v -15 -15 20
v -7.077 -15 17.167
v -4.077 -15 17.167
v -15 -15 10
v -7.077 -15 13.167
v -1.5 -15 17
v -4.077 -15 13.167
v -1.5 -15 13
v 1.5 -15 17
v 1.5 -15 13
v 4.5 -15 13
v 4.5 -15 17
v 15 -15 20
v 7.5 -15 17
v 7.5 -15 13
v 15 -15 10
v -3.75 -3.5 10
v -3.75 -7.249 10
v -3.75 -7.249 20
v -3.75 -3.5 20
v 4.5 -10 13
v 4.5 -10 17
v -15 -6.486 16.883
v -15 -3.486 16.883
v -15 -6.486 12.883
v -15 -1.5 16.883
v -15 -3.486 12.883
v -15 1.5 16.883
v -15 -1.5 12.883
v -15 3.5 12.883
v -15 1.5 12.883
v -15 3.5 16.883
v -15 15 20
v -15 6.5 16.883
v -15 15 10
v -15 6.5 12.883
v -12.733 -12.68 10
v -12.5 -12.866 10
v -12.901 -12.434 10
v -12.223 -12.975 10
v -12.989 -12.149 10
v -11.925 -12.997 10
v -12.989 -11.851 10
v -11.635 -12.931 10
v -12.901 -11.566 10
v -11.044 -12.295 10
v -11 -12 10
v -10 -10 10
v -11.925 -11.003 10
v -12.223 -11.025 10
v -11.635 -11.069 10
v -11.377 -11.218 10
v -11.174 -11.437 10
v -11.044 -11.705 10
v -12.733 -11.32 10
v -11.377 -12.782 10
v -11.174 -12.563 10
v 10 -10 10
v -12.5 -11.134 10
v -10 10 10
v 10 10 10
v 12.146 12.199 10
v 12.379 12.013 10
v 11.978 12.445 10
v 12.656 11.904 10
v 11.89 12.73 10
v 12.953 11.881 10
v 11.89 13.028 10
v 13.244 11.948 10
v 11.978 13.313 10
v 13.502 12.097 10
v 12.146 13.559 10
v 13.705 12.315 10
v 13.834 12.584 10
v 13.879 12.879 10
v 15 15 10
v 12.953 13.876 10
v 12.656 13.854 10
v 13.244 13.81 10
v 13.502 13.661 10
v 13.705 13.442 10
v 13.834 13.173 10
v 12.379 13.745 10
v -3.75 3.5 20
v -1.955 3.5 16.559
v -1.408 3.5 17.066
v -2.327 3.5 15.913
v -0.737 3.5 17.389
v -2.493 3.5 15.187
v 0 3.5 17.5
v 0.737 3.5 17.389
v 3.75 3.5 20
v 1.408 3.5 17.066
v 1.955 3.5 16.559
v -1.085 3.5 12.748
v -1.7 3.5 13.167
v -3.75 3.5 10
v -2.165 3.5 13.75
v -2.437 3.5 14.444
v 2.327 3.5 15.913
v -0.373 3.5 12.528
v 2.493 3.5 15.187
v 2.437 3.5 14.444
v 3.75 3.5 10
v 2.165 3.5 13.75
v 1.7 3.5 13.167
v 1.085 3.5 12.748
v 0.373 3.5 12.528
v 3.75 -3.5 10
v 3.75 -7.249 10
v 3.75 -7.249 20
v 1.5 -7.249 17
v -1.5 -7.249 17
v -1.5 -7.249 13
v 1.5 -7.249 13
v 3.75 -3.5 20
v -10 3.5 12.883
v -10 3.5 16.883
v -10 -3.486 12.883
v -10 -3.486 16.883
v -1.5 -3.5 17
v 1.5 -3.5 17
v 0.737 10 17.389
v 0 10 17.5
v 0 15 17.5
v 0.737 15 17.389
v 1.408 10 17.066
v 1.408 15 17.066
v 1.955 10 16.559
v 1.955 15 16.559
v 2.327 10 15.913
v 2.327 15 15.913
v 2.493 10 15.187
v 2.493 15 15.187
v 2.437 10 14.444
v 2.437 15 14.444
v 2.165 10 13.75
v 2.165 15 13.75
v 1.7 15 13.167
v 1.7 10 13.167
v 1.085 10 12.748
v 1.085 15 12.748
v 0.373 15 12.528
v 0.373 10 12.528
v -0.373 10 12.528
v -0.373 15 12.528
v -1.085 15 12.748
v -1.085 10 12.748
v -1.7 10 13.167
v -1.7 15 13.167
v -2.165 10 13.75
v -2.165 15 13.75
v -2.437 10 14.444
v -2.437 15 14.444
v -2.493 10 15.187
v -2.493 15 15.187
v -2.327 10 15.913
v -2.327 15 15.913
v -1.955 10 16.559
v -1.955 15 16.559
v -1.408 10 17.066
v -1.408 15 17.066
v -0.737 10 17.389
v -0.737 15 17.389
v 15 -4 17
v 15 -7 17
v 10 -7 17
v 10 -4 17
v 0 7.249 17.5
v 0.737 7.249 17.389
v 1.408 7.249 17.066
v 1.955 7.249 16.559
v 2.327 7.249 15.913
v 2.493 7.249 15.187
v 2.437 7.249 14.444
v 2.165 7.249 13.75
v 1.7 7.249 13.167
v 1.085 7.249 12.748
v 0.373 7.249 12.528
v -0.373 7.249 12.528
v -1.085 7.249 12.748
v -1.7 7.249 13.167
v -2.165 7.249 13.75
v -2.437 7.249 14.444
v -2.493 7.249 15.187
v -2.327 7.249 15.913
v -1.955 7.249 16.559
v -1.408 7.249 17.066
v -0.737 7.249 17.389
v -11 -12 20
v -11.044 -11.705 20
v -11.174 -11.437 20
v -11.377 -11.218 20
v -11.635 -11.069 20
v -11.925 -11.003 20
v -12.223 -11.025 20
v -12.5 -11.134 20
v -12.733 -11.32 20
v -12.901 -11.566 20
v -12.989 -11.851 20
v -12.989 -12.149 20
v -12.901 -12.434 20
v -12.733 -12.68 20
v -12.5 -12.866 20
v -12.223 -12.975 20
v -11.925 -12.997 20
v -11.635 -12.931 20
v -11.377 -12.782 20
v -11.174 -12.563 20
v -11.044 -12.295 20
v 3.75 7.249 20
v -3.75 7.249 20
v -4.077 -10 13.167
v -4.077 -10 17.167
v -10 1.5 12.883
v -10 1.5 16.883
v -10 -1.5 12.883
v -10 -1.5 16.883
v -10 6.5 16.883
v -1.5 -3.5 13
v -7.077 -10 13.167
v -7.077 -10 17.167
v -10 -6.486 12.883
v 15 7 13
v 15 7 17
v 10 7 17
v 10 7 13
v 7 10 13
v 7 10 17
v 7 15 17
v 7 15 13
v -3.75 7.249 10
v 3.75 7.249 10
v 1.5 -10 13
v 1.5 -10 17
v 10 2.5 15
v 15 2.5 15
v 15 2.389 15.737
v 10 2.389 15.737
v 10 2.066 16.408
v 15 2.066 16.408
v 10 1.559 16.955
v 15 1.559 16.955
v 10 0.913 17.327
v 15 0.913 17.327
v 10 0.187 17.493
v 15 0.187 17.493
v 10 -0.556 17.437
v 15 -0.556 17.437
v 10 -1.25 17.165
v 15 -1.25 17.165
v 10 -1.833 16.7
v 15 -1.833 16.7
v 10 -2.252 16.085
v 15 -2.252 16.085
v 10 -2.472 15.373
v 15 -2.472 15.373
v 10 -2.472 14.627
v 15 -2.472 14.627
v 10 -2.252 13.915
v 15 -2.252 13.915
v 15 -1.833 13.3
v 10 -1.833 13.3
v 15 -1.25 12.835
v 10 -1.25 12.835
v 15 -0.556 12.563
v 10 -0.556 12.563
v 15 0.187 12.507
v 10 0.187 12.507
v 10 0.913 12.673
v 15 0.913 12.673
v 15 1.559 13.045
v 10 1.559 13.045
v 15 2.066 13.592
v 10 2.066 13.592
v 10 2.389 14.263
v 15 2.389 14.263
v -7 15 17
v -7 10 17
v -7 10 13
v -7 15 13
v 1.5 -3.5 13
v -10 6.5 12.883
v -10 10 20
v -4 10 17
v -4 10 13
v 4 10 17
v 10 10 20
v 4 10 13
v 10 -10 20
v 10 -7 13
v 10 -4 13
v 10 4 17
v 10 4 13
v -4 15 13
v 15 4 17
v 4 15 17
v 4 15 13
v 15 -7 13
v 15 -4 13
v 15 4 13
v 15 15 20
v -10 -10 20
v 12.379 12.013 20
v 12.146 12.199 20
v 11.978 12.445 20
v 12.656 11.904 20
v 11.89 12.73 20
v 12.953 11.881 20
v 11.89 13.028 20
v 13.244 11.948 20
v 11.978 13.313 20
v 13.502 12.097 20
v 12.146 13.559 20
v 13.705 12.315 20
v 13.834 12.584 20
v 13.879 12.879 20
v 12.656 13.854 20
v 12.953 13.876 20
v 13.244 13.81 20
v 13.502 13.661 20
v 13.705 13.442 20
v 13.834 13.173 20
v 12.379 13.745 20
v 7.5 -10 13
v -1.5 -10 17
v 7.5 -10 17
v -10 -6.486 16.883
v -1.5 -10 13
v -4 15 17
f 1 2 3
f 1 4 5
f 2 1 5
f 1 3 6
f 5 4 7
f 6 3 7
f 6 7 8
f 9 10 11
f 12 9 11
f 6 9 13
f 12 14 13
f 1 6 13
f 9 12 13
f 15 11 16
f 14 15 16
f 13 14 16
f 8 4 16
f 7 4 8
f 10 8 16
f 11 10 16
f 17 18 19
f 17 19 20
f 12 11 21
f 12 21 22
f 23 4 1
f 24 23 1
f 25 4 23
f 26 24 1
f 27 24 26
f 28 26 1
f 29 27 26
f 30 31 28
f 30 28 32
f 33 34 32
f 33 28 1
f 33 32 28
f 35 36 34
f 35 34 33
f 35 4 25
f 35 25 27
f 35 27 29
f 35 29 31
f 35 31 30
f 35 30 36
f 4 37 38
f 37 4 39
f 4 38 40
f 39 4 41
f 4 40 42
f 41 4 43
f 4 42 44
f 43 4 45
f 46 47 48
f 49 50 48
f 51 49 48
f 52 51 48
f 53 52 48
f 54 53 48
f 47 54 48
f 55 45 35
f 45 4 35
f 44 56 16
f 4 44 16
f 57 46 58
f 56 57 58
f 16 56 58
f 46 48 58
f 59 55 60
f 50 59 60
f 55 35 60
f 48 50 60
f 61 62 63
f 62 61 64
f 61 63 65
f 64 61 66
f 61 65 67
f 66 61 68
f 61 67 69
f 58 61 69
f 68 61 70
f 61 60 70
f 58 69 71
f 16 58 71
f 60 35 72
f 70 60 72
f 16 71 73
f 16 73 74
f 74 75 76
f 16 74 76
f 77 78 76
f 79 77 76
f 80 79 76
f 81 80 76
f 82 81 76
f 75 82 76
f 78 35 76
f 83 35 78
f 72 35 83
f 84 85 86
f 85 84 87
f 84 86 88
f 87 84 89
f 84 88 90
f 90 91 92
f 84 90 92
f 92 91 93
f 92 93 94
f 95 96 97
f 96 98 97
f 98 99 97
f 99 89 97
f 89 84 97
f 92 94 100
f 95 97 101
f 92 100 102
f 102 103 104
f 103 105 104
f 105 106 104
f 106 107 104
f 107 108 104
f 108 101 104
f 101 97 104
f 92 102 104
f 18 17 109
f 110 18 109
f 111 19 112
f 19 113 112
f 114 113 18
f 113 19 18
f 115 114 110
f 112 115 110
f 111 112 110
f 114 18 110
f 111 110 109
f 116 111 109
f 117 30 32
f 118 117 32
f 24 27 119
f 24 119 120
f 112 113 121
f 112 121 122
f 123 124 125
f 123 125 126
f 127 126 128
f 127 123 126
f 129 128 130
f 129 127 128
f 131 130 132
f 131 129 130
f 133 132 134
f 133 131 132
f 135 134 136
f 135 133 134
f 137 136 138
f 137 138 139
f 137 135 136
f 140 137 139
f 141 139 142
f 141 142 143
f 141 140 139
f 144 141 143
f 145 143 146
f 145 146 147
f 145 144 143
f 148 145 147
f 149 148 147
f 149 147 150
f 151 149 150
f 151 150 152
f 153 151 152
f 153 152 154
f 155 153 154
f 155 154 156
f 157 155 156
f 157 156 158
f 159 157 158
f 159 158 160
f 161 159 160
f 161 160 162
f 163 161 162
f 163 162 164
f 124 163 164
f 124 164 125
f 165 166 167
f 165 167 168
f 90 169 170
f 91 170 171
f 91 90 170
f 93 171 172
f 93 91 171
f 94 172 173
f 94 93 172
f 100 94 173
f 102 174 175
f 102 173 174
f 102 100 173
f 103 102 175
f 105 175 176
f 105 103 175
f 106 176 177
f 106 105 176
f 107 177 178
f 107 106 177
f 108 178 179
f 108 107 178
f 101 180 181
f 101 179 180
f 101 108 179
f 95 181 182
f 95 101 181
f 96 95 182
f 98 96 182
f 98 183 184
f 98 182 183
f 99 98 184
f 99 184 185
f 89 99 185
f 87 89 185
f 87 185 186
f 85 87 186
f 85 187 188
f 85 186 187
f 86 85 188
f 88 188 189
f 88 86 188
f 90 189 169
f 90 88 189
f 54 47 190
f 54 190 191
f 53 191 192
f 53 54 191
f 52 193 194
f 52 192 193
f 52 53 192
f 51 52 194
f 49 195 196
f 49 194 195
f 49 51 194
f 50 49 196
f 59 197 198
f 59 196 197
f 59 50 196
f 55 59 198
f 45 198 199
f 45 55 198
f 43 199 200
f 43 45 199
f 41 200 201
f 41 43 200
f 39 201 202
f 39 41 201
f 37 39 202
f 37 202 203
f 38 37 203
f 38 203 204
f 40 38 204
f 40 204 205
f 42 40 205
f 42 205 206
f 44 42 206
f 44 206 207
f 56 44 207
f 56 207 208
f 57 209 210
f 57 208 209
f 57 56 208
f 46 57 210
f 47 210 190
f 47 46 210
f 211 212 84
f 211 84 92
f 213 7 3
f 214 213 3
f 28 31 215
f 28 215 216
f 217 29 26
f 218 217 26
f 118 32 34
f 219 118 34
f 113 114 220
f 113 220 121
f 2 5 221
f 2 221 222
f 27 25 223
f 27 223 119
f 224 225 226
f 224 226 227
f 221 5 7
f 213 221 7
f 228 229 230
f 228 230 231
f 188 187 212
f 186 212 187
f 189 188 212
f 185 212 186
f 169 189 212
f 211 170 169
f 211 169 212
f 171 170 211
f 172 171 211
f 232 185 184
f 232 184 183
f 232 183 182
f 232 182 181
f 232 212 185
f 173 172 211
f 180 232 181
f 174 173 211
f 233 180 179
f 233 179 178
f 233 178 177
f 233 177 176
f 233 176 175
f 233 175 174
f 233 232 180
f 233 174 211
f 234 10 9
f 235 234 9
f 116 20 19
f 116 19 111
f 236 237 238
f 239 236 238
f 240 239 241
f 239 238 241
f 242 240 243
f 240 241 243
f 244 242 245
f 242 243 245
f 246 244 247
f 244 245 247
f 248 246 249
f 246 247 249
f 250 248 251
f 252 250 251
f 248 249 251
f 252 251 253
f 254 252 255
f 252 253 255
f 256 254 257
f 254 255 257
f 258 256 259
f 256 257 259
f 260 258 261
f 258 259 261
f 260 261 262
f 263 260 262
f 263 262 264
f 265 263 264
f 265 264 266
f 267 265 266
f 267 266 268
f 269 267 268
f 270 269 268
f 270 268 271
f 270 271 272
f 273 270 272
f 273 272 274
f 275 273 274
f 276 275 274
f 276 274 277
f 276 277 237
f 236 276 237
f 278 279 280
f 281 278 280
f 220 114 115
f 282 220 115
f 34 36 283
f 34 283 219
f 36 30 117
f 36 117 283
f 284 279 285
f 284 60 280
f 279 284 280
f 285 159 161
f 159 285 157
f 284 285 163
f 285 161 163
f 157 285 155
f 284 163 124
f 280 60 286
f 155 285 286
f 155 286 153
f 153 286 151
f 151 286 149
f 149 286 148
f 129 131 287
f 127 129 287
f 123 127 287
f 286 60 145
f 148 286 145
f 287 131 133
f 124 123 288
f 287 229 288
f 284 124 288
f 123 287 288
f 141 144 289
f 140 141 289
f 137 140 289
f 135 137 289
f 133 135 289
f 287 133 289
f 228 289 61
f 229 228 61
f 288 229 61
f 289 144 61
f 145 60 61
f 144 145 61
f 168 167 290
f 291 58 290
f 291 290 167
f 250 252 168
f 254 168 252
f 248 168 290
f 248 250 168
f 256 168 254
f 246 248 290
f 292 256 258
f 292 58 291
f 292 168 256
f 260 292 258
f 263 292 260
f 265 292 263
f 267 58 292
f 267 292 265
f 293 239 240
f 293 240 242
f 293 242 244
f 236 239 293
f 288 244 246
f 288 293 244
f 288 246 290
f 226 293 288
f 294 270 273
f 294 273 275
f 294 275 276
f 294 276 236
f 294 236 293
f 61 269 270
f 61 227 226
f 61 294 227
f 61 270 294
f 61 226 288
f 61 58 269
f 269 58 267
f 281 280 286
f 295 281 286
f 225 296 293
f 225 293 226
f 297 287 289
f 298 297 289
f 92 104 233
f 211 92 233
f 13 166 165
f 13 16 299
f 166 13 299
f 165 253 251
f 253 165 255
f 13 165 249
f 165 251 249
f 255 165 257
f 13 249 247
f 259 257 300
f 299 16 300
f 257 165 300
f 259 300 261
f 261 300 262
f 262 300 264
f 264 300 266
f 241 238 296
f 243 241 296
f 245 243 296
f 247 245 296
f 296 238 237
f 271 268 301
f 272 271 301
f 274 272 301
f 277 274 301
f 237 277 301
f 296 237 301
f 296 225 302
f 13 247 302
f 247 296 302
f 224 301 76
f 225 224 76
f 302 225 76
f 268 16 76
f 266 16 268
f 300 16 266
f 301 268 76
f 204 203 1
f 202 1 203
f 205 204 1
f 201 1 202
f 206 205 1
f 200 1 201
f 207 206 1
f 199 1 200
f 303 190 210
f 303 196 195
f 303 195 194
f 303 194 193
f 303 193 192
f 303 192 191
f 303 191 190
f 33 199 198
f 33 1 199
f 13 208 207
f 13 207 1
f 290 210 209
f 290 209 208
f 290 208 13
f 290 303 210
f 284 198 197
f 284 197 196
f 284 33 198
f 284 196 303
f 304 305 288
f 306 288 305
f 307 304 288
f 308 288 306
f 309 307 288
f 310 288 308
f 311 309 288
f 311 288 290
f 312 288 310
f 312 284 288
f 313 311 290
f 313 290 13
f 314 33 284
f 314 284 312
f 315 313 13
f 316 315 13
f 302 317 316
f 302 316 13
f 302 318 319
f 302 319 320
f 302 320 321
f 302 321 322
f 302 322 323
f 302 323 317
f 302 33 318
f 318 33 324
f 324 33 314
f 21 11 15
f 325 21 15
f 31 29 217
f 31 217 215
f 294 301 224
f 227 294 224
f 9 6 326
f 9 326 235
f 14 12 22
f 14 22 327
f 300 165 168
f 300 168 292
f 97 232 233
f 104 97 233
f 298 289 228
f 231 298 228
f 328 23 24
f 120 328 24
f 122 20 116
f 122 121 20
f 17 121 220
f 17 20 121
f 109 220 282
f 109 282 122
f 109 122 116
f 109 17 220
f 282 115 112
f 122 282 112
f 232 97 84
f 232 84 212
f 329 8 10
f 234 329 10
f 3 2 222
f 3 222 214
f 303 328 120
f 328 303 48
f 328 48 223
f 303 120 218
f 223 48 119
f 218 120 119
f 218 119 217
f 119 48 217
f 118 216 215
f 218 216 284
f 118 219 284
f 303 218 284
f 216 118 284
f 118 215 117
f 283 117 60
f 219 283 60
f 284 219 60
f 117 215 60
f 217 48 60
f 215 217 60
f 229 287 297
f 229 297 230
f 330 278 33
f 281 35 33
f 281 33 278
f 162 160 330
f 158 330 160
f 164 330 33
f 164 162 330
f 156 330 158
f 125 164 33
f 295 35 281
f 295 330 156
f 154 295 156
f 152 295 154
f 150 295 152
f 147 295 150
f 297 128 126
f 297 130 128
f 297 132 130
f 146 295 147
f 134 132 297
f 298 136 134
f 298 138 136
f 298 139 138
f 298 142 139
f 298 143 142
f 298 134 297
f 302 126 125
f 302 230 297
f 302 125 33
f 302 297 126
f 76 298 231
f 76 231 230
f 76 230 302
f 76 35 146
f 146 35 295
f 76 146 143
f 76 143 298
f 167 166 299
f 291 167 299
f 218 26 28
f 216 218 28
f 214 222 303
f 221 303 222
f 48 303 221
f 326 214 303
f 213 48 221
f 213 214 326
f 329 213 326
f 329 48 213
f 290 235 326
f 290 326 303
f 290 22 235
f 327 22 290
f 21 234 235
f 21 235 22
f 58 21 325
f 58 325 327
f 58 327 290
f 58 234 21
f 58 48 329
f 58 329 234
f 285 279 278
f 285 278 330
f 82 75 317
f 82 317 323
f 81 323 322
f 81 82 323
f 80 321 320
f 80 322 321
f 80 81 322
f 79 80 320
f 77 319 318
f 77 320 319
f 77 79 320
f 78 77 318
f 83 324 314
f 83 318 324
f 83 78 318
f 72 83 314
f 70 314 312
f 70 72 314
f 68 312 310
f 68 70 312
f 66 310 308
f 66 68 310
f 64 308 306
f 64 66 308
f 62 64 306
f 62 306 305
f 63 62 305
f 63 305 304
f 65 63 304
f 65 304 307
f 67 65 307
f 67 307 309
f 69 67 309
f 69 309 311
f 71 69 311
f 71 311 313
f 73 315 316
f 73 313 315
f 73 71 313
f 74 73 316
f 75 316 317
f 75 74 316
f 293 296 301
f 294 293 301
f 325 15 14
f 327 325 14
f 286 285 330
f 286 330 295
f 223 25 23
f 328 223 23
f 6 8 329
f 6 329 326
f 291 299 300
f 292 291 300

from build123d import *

# Parameters (mm, degrees)
SKETCH1_W             = 30
SKETCH1_H             = 30
BOSS_EXTRUDE1_DEPTH   = 10
SKETCH2_W             = 30
SKETCH2_H             = 30
SKETCH2_W_2           = 20
SKETCH2_H_2           = 20
BOSS_EXTRUDE2_DEPTH   = 10
SKETCH2_W_3           = 7.5
SKETCH2_H_3           = 3.748828889
BOSS_EXTRUDE2_2_DEPTH = 10
BOSS_EXTRUDE2_3_DEPTH = 10
SKETCH3_W             = 30
SKETCH3_H             = 30
BOSS_EXTRUDE3_DEPTH   = 10
SKETCH4_R             = 3.1
CUT_EXTRUDE1_DEPTH    = 10
SKETCH5_R             = 3.1
CUT_EXTRUDE2_DEPTH    = 10
CUT_EXTRUDE3_START    = -30
SKETCH8_R             = 1
CUT_EXTRUDE3_DEPTH    = 30
CUT_EXTRUDE5_START    = -11.5
SKETCH9_R             = 2.5
SKETCH9_W             = 3
SKETCH9_H             = 4
CUT_EXTRUDE5_DEPTH    = 11.5
SKETCH10_R            = 2.5
SKETCH10_W            = 4
SKETCH10_H            = 3
CUT_EXTRUDE6_DEPTH    = 10
SKETCH11_W            = 4
SKETCH11_H            = 3
CUT_EXTRUDE7_DEPTH    = 9
SKETCH13_W            = 3
SKETCH13_H            = 4
CUT_EXTRUDE9_DEPTH    = 13


with BuildPart() as part:
    # Sketch1 → Boss-Extrude1 (new body)
    with BuildSketch(Plane.XY):
        Rectangle(SKETCH1_W, SKETCH1_H)
    extrude(amount=BOSS_EXTRUDE1_DEPTH)

    # Sketch5 → Cut-Extrude2 (cut)
    with BuildSketch(Plane(origin=(0, 0, 0), x_dir=(-1, 0, 0), z_dir=(0, 0, -1))):
        with Locations((-6, -0.372899474)):
            Circle(SKETCH5_R)
    extrude(amount=-CUT_EXTRUDE2_DEPTH, mode=Mode.SUBTRACT)


with BuildPart() as body_2:
    # Sketch2 → Boss-Extrude2 (new body)
    with BuildSketch(Plane.XY.offset(10)):
        Rectangle(SKETCH2_W, SKETCH2_H)
        Rectangle(SKETCH2_W_2, SKETCH2_H_2, mode=Mode.SUBTRACT)
    extrude(amount=BOSS_EXTRUDE2_DEPTH)


with BuildPart() as body_3:
    # Sketch2 → Boss-Extrude2 2 (new body)
    with BuildSketch(Plane.XY.offset(10)):
        with Locations((0, 5.374414445)):
            Rectangle(SKETCH2_W_3, SKETCH2_H_3)
    extrude(amount=BOSS_EXTRUDE2_2_DEPTH)


with BuildPart() as body_4:
    # Sketch2 → Boss-Extrude2 3 (new body)
    with BuildSketch(Plane.XY.offset(10)):
        with Locations((0, -5.374414445)):
            Rectangle(SKETCH2_W_3, SKETCH2_H_3)
    extrude(amount=BOSS_EXTRUDE2_3_DEPTH)


with BuildPart() as body_5:
    # Sketch3 → Boss-Extrude3 (new body)
    with BuildSketch(Plane.XY.offset(20)):
        Rectangle(SKETCH3_W, SKETCH3_H)
    extrude(amount=BOSS_EXTRUDE3_DEPTH)

    # Sketch4 → Cut-Extrude1 (cut)
    with BuildSketch(Plane.XY.offset(30)):
        with Locations((-6, 0)):
            Circle(SKETCH4_R)
    extrude(amount=-CUT_EXTRUDE1_DEPTH, mode=Mode.SUBTRACT)


with BuildPart() as cut_extrude3_tool:
    # Sketch8 → Cut-Extrude3 (new body)
    with BuildSketch(Plane.XY.offset(30).offset(CUT_EXTRUDE3_START)):
        with Locations((-12, -12)):
            Circle(SKETCH8_R)
        with Locations((12.878679656, 12.878679656)):
            Circle(SKETCH8_R)
    extrude(amount=CUT_EXTRUDE3_DEPTH)


with BuildPart() as part_1:
    add(part.part)

    # Cut-Extrude3: cut by cut_extrude3_tool
    add(cut_extrude3_tool.part, mode=Mode.SUBTRACT)


with BuildPart() as body_2_1:
    add(body_2.part)

    # Cut-Extrude3: cut by cut_extrude3_tool
    add(cut_extrude3_tool.part, mode=Mode.SUBTRACT)


with BuildPart() as body_5_1:
    add(body_5.part)

    # Cut-Extrude3: cut by cut_extrude3_tool
    add(cut_extrude3_tool.part, mode=Mode.SUBTRACT)


with BuildPart() as cut_extrude5_tool:
    # Sketch9 → Cut-Extrude5 (new body)
    with BuildSketch(Plane(origin=(0, 15, 0), x_dir=(1, 0, 0), z_dir=(0, 1, 0)).offset(CUT_EXTRUDE5_START)):
        with Locations(Location((0, -15, 0), (0, 0, 270))):
            Circle(SKETCH9_R)
        with Locations((-5.5, -15)):
            Rectangle(SKETCH9_W, SKETCH9_H)
        with Locations((5.5, -15)):
            Rectangle(SKETCH9_W, SKETCH9_H)
    extrude(amount=CUT_EXTRUDE5_DEPTH)


with BuildPart() as body_2_2:
    add(body_2_1.part)

    # Cut-Extrude5: cut by cut_extrude5_tool
    add(cut_extrude5_tool.part, mode=Mode.SUBTRACT)

    # Sketch10 → Cut-Extrude6 (cut)
    with BuildSketch(Plane(origin=(15, 0, 0), x_dir=(0, 0, -1), z_dir=(1, 0, 0))):
        with Locations(Location((-15, 0, 0), (0, 0, 90))):
            Circle(SKETCH10_R)
        with Locations((-15, 5.5)):
            Rectangle(SKETCH10_W, SKETCH10_H)
        with Locations((-15, -5.5)):
            Rectangle(SKETCH10_W, SKETCH10_H)
    extrude(amount=-CUT_EXTRUDE6_DEPTH, mode=Mode.SUBTRACT)

    # Sketch11 → Cut-Extrude7 (cut)
    with BuildSketch(Plane.ZY.offset(15)):
        with Locations((14.883452823, 5)):
            Rectangle(SKETCH11_W, SKETCH11_H)
        with Locations((14.883452823, 0)):
            Rectangle(SKETCH11_W, SKETCH11_H)
        with Locations((14.883452823, -4.985769597)):
            Rectangle(SKETCH11_W, SKETCH11_H)
    extrude(amount=-CUT_EXTRUDE7_DEPTH, mode=Mode.SUBTRACT)


with BuildPart() as body_3_1:
    add(body_3.part)

    # Cut-Extrude5: cut by cut_extrude5_tool
    add(cut_extrude5_tool.part, mode=Mode.SUBTRACT)


with BuildPart() as cut_extrude9_tool:
    # Sketch13 → Cut-Extrude9 (new body)
    with BuildSketch(Plane.XZ.offset(15)):
        with Locations((0, 15)):
            Rectangle(SKETCH13_W, SKETCH13_H)
        with Locations((6, 15)):
            Rectangle(SKETCH13_W, SKETCH13_H)
        with Locations((-5.576653418, 15.166702073)):
            Rectangle(SKETCH13_W, SKETCH13_H)
    extrude(amount=-CUT_EXTRUDE9_DEPTH)


with BuildPart() as body_2_3:
    add(body_2_2.part)

    # Cut-Extrude9: cut by cut_extrude9_tool
    add(cut_extrude9_tool.part, mode=Mode.SUBTRACT)


with BuildPart() as body_4_1:
    add(body_4.part)

    # Cut-Extrude9: cut by cut_extrude9_tool
    add(cut_extrude9_tool.part, mode=Mode.SUBTRACT)


solid = Compound([body_3_1.part, body_2_3.part, body_4_1.part])
